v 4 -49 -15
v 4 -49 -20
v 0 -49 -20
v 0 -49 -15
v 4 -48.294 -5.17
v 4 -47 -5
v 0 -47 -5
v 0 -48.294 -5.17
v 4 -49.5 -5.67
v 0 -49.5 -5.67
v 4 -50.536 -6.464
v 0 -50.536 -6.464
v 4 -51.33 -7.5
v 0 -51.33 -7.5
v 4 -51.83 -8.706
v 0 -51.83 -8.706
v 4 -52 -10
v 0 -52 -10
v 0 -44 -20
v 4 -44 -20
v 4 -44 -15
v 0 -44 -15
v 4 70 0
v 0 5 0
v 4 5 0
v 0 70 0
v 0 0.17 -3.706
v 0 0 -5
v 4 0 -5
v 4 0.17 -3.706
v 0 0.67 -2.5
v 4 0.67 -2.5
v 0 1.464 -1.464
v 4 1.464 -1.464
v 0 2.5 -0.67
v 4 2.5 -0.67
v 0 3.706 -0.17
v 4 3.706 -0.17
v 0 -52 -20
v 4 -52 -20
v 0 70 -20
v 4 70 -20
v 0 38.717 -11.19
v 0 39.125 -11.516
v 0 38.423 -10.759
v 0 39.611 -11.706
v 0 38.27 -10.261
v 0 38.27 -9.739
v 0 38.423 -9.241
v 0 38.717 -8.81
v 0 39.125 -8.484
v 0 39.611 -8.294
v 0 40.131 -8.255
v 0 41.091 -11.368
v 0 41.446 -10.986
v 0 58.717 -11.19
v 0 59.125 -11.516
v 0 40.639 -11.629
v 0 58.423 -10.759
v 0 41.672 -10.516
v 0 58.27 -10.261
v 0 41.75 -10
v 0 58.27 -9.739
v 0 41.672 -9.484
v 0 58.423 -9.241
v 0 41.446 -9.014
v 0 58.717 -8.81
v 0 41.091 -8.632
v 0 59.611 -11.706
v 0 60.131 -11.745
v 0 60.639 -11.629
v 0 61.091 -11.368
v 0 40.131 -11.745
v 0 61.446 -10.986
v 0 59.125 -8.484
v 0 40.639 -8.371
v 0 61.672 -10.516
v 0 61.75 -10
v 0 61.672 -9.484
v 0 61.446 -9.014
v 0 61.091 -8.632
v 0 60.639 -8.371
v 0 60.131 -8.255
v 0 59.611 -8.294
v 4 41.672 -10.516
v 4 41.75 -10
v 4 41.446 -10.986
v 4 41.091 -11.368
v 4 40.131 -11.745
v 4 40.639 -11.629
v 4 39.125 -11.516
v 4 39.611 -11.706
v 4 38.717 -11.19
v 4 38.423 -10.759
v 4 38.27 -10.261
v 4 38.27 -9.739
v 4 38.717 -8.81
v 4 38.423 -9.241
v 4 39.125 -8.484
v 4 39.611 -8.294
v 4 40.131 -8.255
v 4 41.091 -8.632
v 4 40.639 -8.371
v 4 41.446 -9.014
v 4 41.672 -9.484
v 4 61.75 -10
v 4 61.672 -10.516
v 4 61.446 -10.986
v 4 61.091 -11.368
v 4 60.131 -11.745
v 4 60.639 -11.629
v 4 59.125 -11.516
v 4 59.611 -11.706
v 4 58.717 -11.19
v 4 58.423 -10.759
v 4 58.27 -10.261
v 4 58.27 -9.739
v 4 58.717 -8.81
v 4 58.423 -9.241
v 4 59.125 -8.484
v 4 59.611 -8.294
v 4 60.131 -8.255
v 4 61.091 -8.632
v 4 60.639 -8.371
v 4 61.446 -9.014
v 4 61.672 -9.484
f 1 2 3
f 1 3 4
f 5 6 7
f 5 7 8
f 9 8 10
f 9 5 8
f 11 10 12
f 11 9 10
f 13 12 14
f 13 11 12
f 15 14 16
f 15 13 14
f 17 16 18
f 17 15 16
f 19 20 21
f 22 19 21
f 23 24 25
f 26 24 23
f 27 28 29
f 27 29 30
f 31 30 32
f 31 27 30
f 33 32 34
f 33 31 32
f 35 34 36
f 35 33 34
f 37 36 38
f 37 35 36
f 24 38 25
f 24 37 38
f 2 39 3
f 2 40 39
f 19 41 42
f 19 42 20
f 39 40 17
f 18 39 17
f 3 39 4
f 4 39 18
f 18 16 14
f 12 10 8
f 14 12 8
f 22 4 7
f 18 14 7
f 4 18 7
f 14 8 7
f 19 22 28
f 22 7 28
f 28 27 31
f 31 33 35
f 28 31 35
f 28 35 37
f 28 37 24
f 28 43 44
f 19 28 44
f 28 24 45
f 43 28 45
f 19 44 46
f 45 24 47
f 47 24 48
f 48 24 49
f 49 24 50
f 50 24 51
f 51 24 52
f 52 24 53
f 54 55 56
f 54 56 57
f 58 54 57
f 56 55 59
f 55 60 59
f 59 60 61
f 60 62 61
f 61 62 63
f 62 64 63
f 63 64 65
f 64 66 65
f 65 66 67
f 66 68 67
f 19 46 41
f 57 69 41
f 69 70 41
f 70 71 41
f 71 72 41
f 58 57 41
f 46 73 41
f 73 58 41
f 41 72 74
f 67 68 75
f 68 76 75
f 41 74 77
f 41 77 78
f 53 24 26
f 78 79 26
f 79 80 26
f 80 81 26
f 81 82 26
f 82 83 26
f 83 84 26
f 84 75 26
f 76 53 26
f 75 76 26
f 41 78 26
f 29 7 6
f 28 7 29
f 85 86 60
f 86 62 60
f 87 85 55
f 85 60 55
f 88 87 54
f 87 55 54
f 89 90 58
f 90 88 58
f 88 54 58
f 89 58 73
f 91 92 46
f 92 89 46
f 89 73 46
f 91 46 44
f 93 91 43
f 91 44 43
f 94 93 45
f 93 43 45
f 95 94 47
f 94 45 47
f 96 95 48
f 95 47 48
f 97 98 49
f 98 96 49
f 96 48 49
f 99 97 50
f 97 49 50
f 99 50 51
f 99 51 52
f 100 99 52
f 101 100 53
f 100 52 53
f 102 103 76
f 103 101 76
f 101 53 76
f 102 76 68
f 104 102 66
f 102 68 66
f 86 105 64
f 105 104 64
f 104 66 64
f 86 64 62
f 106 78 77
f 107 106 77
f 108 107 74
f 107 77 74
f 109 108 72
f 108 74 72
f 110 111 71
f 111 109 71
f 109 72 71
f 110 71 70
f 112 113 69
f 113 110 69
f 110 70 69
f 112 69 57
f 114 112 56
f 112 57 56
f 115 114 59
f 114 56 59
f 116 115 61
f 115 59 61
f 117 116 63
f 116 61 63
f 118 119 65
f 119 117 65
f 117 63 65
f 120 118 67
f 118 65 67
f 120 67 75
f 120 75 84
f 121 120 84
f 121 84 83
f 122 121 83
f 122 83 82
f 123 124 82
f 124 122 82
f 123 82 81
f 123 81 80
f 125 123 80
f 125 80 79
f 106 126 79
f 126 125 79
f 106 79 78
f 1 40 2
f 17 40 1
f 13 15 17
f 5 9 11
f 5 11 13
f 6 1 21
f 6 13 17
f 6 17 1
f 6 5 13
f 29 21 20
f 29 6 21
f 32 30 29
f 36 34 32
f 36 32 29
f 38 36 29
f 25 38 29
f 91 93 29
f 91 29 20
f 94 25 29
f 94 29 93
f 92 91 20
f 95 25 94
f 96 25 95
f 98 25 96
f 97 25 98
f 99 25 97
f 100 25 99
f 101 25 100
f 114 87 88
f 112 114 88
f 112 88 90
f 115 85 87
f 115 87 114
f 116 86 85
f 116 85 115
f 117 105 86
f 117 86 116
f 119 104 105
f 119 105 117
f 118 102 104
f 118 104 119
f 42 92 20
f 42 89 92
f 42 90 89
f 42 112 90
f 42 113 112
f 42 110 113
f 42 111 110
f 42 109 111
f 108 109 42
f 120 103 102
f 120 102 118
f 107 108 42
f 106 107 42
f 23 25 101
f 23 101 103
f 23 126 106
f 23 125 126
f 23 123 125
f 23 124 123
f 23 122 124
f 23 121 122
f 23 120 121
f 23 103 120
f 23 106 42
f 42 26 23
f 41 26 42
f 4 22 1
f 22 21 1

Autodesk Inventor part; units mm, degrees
ref_plane "YZ Plane" through (0, 0, 0) normal (1, 0, 0) x (0, 1, 0)
ref_plane "XZ Plane" through (0, 0, 0) normal (0, 1, 0) x (-1, 0, 0)
ref_plane "XY Plane" through (0, 0, 0) normal (0, 0, 1) x (1, 0, 0)
sketch "Sketch1" plane through (0, 0, 0) normal (1, 0, 0) x (0, 1, 0)
  line L0 (5, 0) -> (70, 0)
  line L1 (70, 0) -> (70, -20)
  line L2 (70, -20) -> (0, -20)
  line L3 (0, -5) -> (0, -5)
  circle A0 centre (60, -10) radius 1.75
  circle A1 centre (40, -10) radius 1.75
  line L4 (0, -20) -> (-45, -20)
  line L5 (-45, -20) -> (-45, -10)
  line L6 (-40, -5) -> (0, -5)
  arc A2 (5, 0) -> (0, -5) centre (5, -5) ccw
  arc A3 (-40, -5) -> (-45, -10) centre (-40, -10) ccw
  point P0 (0, 0)
  point P1 (-45, -5)
  dimension "d0" = 70
  dimension "d1" = 20
  dimension "d4" = 3.5
  dimension "d5" = 3.5
  dimension "d6" = 45
  dimension "d7" = 15
  dimension "d8" = 5
extrude "Extrusion1" add sketch "Sketch1" along normal blind 4
sketch "Sketch2" plane through (4, 0, 0) normal (1, 0, 0) x (0, 0, -1)
  arc A0 (5, -40) -> (10, -45) centre (10, -40) ccw projected
  line L0 (20, -52) -> (10, -52)
  line L1 (5, -47) -> (5, -40)
  arc A1 (5, -47) -> (10, -52) centre (10, -47) ccw
  line L2 (20, -52) -> (20, -49)
  line L3 (20, -49) -> (15, -49)
  line L4 (15, -49) -> (15, -39)
  line L5 (15, -39) -> (20, -39)
  line L6 (5, -40) -> (15, -40)
  point P0 (0, 0)
  point P1 (5, -52)
  dimension "d11" = 15
  dimension "d13" = 5
  dimension "d14" = 3
  dimension "d15" = 5
  dimension "d16" = 10
extrude "Extrusion2" add sketch "Sketch2" against normal blind 4
sketch "Sketch3" plane through (4, 0, 0) normal (1, 0, 0) x (0, 0, -1)
  line L0 (15, -45) -> (20, -45) projected
  line L1 (15, -45) -> (20, -45)
  line L2 (20, -45) -> (20, -44)
  line L3 (20, -44) -> (15, -44)
  line L4 (15, -44) -> (15, -45)
  point P0 (0, 0)
  dimension "d19" = 5
  dimension "d20" = 1
extrude "Extrusion3" cut sketch "Sketch3" against normal blind 4
properties part number "g_griper left jaw_arm"
